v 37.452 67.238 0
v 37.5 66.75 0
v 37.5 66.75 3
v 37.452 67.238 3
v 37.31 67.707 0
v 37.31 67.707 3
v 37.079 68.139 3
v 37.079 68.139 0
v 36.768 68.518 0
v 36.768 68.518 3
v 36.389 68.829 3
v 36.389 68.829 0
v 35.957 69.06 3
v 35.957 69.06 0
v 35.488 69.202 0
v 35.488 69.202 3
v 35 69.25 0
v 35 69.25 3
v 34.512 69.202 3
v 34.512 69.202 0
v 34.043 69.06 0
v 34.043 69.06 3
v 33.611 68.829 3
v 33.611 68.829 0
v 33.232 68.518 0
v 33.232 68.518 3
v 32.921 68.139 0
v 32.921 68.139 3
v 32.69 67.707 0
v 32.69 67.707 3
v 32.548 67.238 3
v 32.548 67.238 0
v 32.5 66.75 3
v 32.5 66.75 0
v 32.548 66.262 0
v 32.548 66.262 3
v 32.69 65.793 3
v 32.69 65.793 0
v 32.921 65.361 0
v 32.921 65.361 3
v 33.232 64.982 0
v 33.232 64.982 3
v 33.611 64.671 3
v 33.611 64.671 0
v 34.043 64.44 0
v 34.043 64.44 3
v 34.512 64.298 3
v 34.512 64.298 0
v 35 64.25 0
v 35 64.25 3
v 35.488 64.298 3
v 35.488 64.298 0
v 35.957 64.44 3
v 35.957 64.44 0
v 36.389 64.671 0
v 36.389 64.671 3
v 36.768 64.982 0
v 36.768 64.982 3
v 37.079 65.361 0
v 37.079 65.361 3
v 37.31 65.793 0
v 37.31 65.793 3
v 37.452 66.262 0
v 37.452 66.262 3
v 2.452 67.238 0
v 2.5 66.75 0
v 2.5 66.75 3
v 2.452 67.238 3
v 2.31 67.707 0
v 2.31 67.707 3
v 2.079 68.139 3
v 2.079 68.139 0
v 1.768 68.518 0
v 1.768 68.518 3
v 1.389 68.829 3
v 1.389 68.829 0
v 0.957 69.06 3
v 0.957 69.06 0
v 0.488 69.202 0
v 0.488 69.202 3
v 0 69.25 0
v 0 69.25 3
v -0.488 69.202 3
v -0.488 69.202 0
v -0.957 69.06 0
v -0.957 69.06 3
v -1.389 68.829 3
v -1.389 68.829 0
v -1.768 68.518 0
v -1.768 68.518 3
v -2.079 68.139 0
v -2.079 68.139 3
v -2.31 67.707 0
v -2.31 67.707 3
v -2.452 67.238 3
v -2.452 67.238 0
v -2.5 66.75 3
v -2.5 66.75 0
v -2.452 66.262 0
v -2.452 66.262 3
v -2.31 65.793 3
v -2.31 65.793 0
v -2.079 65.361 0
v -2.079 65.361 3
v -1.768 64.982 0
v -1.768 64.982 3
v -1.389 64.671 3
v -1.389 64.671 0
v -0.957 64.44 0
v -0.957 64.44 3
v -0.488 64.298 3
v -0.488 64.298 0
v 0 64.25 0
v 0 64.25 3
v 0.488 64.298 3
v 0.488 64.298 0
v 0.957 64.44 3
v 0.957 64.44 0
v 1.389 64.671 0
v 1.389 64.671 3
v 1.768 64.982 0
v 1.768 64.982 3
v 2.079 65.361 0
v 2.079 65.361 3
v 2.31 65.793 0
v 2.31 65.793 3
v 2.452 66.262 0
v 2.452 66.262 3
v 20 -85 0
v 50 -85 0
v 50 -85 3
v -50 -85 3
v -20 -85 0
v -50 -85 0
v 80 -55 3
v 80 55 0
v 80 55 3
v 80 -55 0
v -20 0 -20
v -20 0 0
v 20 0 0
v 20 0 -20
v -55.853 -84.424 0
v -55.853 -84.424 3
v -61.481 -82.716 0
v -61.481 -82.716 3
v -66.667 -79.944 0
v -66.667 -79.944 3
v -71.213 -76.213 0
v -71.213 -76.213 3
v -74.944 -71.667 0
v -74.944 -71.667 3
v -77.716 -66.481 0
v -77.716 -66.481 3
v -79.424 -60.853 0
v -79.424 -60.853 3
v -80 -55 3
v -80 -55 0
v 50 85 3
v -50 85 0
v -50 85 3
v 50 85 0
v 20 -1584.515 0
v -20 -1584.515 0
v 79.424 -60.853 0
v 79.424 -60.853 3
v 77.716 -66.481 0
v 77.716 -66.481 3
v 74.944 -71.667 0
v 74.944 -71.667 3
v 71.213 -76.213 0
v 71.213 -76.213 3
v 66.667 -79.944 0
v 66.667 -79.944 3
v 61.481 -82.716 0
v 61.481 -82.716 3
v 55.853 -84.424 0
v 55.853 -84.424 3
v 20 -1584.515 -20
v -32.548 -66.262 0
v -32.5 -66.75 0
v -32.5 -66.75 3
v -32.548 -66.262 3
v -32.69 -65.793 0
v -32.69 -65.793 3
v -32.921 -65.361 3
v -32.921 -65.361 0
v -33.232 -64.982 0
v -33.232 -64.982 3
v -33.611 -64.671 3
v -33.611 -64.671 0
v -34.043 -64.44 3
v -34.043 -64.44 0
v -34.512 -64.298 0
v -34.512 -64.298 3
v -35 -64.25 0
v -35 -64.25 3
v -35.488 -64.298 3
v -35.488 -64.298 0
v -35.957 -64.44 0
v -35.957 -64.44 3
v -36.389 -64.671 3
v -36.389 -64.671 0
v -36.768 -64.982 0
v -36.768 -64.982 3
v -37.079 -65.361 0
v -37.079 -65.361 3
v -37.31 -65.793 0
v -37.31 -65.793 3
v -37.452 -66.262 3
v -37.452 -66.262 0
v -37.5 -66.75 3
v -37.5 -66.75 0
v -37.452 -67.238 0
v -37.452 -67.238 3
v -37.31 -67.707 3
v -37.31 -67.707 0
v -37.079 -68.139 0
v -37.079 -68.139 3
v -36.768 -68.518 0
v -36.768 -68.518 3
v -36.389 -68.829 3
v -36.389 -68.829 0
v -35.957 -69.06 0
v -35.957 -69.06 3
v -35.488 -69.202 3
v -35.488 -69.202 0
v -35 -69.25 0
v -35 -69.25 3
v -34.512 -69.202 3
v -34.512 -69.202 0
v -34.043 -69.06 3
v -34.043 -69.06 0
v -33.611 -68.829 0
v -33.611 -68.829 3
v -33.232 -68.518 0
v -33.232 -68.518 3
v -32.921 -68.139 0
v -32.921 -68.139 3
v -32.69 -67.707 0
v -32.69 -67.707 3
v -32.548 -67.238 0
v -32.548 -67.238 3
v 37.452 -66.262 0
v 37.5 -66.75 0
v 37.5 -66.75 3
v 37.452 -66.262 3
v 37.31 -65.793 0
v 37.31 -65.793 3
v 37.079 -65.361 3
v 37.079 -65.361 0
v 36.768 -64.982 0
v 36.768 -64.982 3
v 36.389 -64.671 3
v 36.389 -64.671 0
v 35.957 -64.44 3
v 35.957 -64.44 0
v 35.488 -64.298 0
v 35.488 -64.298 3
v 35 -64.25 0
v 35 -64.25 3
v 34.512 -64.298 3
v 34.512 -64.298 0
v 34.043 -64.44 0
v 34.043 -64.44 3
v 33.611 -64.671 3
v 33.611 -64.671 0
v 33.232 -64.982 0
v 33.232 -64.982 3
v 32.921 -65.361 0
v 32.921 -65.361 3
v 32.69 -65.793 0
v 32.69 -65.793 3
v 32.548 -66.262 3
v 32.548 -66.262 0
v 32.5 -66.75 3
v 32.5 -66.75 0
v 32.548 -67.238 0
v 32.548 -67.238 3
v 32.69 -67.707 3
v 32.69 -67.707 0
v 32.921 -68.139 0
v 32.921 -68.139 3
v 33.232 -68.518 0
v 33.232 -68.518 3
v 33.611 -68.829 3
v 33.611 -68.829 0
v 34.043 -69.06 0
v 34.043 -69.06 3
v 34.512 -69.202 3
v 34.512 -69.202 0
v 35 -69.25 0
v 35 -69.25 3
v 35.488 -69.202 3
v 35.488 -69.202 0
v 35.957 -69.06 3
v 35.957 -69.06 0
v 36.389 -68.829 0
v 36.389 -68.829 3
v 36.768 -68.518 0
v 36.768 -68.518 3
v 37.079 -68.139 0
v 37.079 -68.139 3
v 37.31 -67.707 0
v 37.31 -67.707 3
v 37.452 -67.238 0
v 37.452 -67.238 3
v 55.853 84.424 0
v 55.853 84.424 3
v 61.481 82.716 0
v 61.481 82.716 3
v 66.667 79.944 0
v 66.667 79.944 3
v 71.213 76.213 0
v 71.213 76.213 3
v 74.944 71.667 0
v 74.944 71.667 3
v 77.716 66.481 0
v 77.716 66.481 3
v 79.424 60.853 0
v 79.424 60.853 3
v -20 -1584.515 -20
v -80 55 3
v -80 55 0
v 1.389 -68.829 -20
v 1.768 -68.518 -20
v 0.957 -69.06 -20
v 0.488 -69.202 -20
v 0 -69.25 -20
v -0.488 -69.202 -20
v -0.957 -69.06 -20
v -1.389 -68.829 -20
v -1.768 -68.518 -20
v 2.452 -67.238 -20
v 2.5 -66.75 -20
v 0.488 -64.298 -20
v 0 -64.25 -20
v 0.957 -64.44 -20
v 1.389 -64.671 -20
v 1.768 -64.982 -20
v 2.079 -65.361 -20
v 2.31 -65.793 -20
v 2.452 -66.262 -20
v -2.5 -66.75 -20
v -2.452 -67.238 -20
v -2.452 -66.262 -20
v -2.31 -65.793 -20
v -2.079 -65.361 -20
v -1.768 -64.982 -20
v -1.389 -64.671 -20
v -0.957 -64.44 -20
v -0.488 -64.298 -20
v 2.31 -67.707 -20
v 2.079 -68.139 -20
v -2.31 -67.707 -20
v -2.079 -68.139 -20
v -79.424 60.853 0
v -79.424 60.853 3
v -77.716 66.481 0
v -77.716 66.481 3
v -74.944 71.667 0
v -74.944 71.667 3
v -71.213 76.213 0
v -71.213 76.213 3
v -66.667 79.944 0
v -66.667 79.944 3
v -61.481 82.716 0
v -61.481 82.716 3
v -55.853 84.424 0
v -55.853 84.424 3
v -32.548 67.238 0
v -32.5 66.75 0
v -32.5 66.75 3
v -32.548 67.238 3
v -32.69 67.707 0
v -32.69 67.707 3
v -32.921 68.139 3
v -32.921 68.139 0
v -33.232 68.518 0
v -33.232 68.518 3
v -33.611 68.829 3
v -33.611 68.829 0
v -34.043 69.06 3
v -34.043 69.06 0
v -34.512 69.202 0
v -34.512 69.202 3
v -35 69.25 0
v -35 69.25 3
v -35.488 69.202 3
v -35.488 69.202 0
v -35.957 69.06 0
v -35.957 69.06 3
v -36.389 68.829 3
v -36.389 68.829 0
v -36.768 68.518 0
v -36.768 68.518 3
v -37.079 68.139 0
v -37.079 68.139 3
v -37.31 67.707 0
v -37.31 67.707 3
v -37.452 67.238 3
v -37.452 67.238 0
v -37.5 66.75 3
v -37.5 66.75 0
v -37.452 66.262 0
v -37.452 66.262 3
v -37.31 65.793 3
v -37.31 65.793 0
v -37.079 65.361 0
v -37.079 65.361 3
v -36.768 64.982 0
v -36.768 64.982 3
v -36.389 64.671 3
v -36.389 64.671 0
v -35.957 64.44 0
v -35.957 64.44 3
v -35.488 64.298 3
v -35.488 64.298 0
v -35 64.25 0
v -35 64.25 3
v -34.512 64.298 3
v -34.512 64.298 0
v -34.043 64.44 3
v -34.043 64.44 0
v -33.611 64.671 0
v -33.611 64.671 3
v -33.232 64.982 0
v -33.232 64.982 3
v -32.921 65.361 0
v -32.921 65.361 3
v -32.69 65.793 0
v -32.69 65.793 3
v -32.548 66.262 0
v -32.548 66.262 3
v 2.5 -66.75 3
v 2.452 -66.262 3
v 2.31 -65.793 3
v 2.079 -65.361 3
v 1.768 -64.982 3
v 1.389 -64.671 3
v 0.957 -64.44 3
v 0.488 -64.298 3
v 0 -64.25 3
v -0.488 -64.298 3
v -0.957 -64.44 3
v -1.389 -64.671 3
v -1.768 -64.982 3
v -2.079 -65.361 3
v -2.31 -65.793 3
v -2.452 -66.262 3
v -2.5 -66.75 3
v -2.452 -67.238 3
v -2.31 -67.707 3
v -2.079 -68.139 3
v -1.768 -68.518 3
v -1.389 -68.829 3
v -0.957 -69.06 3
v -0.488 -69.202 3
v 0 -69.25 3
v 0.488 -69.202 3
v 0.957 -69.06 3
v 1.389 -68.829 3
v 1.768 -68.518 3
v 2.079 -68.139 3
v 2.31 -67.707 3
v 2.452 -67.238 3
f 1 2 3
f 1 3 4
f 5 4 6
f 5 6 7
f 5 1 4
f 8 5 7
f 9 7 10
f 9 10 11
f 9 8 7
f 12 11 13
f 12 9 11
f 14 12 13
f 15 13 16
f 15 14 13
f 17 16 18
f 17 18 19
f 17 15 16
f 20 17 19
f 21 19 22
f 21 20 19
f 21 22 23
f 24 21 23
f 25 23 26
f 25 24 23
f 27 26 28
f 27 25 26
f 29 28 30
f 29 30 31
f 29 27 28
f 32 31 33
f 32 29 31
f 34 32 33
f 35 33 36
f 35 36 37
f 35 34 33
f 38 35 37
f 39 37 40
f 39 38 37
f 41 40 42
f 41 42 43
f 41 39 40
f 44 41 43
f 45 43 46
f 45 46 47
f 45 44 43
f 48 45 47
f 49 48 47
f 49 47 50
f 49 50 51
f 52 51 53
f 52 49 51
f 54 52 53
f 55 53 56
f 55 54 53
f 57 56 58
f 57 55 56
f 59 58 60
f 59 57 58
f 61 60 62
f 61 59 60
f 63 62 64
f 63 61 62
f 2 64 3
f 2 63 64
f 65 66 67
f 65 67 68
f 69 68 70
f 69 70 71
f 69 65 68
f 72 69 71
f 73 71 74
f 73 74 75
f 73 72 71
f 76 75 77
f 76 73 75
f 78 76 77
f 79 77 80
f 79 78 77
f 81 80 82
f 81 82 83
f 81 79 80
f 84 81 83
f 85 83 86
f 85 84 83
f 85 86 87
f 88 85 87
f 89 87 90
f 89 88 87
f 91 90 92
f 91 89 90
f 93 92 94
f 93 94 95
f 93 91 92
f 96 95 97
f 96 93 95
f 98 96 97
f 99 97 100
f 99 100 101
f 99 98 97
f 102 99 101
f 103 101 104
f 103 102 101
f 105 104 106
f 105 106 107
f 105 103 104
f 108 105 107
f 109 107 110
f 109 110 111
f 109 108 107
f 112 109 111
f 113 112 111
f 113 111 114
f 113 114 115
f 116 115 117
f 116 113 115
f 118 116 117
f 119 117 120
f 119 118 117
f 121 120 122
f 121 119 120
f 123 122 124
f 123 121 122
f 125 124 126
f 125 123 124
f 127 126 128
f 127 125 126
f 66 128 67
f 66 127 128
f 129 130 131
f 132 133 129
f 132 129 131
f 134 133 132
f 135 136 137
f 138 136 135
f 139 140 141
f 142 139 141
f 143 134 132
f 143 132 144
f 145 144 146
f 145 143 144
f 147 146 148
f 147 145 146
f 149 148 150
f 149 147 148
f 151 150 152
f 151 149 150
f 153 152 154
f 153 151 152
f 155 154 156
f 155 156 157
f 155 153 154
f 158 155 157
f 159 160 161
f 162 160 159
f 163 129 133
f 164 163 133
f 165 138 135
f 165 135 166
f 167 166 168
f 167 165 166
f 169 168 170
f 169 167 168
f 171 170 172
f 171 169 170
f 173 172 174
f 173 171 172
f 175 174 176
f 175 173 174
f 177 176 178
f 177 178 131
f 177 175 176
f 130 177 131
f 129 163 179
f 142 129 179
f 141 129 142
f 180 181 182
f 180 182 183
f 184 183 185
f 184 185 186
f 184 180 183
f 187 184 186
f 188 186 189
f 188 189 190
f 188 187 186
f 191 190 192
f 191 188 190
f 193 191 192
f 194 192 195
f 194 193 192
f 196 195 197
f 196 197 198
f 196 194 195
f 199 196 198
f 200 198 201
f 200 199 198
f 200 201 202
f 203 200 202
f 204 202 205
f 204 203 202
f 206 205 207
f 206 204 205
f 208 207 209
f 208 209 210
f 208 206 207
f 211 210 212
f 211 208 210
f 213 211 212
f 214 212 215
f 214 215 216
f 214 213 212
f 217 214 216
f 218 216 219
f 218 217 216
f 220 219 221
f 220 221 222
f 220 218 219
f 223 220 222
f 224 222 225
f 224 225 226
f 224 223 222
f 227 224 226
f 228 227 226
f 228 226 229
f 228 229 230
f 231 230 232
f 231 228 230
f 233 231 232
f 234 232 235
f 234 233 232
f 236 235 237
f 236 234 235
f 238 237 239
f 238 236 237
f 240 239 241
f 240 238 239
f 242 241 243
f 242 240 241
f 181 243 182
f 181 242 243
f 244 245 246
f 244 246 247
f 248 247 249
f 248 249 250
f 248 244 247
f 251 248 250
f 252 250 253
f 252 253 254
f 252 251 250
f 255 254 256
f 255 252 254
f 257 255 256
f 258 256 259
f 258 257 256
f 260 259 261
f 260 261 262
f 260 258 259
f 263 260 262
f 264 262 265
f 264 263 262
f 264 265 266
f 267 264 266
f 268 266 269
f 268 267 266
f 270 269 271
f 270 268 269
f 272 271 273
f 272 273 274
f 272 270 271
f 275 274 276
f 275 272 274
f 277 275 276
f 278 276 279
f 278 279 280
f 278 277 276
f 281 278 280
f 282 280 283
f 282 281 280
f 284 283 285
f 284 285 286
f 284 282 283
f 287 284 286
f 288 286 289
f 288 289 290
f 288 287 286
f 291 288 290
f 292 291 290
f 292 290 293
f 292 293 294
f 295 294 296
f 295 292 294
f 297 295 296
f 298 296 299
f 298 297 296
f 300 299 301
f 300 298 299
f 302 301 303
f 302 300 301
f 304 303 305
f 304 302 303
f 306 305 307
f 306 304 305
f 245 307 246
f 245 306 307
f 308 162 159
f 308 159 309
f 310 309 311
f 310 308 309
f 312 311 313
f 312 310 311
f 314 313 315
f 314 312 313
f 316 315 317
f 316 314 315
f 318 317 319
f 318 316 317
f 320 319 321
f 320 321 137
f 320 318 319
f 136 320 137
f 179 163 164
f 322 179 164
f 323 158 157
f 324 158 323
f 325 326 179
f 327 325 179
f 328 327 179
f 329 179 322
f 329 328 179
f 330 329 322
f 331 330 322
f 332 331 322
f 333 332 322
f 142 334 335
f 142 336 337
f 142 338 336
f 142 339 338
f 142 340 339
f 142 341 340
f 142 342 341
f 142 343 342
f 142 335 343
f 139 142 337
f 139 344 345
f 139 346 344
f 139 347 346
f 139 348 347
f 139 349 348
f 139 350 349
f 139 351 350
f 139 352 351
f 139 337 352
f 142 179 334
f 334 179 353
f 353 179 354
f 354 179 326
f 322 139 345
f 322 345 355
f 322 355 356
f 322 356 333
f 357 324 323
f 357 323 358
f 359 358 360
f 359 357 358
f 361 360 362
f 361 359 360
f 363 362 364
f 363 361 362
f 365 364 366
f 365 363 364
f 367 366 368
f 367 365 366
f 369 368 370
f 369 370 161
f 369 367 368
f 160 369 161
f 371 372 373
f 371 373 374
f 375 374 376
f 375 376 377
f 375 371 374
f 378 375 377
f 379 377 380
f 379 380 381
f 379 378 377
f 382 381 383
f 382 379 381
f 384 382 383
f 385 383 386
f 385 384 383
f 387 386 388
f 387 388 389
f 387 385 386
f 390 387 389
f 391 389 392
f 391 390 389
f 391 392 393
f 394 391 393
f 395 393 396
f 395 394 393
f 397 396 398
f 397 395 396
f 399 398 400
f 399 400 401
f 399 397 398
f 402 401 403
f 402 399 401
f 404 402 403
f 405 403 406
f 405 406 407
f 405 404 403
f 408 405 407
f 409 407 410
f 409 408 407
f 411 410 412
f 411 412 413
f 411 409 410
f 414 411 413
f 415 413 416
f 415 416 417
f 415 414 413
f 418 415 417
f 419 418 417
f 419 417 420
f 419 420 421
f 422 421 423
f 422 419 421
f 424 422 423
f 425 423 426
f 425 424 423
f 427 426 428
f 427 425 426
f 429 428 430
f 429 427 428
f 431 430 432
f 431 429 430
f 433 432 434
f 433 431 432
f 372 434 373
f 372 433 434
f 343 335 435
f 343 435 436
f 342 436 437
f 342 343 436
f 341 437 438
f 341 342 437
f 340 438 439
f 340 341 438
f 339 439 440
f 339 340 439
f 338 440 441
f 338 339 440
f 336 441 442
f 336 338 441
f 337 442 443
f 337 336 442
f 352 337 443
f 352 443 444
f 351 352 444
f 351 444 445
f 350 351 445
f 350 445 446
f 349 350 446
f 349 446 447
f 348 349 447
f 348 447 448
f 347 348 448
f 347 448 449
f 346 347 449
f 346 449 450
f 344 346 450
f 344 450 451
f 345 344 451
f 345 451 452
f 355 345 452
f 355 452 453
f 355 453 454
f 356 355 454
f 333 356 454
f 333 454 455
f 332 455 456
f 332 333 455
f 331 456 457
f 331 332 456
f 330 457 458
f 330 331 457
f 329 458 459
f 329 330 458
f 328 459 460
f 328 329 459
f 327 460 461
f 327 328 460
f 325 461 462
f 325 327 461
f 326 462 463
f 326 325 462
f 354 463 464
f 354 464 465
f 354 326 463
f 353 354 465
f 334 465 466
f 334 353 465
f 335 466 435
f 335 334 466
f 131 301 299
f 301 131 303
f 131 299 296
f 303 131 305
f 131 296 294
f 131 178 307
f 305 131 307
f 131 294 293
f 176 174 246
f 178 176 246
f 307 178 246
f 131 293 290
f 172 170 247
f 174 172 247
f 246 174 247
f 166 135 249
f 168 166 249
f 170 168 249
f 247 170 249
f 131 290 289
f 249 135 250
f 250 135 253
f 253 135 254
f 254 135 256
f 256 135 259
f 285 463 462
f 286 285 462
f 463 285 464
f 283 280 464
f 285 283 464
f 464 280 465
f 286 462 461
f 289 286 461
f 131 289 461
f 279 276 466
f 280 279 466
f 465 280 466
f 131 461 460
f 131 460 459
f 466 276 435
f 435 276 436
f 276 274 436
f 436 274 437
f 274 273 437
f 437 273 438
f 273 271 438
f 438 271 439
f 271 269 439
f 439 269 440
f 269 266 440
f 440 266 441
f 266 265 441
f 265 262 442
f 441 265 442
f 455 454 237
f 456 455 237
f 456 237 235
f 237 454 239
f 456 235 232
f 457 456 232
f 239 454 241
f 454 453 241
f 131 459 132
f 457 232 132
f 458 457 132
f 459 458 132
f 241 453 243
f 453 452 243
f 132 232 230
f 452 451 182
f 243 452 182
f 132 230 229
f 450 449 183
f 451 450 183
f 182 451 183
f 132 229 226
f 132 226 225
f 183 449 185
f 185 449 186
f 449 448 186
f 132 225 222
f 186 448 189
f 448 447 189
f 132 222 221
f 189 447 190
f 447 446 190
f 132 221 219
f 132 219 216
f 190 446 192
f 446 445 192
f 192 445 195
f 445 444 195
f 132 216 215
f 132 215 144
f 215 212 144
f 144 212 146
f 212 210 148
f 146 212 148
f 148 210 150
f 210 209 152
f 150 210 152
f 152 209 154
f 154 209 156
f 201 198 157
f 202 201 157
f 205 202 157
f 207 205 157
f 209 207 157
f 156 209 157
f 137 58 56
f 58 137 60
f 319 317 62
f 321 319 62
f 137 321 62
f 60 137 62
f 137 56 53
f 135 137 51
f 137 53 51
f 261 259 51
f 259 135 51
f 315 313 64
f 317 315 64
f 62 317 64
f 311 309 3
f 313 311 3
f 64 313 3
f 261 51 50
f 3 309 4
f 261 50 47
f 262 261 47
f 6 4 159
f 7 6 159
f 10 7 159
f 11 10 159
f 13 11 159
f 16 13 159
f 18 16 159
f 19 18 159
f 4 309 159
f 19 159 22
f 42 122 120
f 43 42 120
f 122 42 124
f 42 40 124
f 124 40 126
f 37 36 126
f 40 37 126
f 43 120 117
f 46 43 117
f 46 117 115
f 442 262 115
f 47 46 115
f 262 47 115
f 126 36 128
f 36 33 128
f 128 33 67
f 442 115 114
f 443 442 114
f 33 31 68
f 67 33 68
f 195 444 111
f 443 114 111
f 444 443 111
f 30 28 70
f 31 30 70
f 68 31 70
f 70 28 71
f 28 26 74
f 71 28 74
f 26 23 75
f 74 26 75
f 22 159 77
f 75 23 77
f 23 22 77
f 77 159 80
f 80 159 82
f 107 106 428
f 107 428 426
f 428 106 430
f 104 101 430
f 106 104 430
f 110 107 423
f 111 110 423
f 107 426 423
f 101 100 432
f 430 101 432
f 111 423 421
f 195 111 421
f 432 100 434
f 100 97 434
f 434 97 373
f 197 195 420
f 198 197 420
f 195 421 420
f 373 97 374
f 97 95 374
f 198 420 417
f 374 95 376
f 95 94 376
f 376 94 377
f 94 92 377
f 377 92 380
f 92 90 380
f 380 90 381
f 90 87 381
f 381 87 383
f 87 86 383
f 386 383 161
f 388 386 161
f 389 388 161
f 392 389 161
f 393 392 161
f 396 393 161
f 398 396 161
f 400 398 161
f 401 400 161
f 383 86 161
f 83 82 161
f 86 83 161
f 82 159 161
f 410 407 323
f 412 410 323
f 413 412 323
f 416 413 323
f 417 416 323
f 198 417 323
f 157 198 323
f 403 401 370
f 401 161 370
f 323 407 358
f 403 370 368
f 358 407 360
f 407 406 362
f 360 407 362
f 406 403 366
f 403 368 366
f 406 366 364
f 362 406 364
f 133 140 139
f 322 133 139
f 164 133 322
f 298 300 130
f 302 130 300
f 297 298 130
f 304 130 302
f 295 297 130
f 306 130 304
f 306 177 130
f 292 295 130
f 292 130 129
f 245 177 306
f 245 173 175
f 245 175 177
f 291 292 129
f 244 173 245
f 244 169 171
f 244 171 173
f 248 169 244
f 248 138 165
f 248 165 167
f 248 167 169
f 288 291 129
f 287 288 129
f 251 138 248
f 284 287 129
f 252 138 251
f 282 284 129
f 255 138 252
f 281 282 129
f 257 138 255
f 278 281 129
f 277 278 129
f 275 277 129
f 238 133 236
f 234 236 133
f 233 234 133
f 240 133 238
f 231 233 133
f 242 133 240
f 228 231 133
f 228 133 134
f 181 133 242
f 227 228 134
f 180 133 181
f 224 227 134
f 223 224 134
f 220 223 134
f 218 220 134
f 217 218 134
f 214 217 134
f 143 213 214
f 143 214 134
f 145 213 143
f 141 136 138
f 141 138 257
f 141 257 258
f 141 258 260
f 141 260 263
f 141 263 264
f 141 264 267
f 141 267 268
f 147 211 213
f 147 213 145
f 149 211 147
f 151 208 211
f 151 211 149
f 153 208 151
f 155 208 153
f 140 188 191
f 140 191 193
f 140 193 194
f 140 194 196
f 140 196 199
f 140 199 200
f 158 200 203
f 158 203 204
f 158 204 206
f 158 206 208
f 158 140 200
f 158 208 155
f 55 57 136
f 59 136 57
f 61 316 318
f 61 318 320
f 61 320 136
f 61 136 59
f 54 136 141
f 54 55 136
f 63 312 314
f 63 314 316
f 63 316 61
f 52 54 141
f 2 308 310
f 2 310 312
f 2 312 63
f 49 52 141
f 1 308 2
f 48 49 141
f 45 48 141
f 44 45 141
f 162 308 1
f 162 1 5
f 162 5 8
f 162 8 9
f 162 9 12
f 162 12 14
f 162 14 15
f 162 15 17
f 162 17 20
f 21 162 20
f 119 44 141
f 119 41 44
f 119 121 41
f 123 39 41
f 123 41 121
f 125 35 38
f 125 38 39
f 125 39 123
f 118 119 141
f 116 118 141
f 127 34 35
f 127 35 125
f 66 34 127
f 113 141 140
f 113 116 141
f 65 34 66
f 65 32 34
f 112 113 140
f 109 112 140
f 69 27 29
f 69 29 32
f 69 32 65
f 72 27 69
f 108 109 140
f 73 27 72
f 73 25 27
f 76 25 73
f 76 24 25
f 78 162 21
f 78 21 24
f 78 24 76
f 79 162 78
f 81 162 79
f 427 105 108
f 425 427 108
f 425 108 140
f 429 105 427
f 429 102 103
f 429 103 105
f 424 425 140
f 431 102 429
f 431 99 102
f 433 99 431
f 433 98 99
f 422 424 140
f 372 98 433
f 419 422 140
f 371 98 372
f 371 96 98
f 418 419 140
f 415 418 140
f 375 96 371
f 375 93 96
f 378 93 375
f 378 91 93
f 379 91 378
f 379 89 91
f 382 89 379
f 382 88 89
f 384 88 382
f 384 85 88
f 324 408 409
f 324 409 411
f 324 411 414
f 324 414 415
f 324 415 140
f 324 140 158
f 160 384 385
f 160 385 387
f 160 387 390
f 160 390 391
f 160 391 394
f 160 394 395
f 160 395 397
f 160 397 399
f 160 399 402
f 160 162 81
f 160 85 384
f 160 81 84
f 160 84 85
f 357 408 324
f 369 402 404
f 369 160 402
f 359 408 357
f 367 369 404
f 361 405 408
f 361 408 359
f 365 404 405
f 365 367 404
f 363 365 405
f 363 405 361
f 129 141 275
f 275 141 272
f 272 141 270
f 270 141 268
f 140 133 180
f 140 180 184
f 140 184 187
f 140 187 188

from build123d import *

# Parameters (mm, degrees)
CROQUIS1_R                 = 2.5
SALIENTE_EXTRUIR1_DEPTH    = 3
SALIENTE_EXTRUIR2_DEPTH    = 20
CORTAR_EXTRUIR1_DEPTH      = 99
CORTAR_EXTRUIR1_DEPTH_BACK = 71
CROQUIS3_R                 = 2.5


with BuildPart() as part:
    # Croquis1 → Saliente-Extruir1 (new body)
    with BuildSketch(Plane.XY):
        with BuildLine():
            Line((-50, 85), (50, 85))
            ThreePointArc((50, 85), (71.213203436, 76.213203436), (80, 55))
            Line((80, 55), (80, -55))
            ThreePointArc((80, -55), (71.213203436, -76.213203436), (50, -85))
            Line((50, -85), (-50, -85))
            ThreePointArc((-50, -85), (-71.213203436, -76.213203436), (-80, -55))
            Line((-80, -55), (-80, 55))
            ThreePointArc((-80, 55), (-71.213203436, 76.213203436), (-50, 85))
        make_face()
        with Locations((0, -66.75)):
            Circle(CROQUIS1_R, mode=Mode.SUBTRACT)
        with Locations((0, 66.75)):
            Circle(CROQUIS1_R, mode=Mode.SUBTRACT)
        with Locations((-35, 66.75)):
            Circle(CROQUIS1_R, mode=Mode.SUBTRACT)
        with Locations((35, 66.75)):
            Circle(CROQUIS1_R, mode=Mode.SUBTRACT)
        with Locations((-35, -66.75)):
            Circle(CROQUIS1_R, mode=Mode.SUBTRACT)
        with Locations((35, -66.75)):
            Circle(CROQUIS1_R, mode=Mode.SUBTRACT)
    extrude(amount=SALIENTE_EXTRUIR1_DEPTH)

    # Croquis2 → Saliente-Extruir2 (add)
    with BuildSketch(Plane.XY):
        Polygon((-20, 0), (20, 0), (20, -665), (20, -1584.514762196), (-20, -1584.514762196), (-20, -665), align=None)
    extrude(amount=-SALIENTE_EXTRUIR2_DEPTH)

    # Croquis3 → Cortar-Extruir1 (cut, two sides: drawn at the far end of the back side and taken through both)
    with BuildSketch(Plane.XY.offset(-CORTAR_EXTRUIR1_DEPTH_BACK)):
        with Locations((0, -66.75)):
            Circle(CROQUIS3_R)
    extrude(amount=CORTAR_EXTRUIR1_DEPTH + CORTAR_EXTRUIR1_DEPTH_BACK, mode=Mode.SUBTRACT)


solid = part.part
